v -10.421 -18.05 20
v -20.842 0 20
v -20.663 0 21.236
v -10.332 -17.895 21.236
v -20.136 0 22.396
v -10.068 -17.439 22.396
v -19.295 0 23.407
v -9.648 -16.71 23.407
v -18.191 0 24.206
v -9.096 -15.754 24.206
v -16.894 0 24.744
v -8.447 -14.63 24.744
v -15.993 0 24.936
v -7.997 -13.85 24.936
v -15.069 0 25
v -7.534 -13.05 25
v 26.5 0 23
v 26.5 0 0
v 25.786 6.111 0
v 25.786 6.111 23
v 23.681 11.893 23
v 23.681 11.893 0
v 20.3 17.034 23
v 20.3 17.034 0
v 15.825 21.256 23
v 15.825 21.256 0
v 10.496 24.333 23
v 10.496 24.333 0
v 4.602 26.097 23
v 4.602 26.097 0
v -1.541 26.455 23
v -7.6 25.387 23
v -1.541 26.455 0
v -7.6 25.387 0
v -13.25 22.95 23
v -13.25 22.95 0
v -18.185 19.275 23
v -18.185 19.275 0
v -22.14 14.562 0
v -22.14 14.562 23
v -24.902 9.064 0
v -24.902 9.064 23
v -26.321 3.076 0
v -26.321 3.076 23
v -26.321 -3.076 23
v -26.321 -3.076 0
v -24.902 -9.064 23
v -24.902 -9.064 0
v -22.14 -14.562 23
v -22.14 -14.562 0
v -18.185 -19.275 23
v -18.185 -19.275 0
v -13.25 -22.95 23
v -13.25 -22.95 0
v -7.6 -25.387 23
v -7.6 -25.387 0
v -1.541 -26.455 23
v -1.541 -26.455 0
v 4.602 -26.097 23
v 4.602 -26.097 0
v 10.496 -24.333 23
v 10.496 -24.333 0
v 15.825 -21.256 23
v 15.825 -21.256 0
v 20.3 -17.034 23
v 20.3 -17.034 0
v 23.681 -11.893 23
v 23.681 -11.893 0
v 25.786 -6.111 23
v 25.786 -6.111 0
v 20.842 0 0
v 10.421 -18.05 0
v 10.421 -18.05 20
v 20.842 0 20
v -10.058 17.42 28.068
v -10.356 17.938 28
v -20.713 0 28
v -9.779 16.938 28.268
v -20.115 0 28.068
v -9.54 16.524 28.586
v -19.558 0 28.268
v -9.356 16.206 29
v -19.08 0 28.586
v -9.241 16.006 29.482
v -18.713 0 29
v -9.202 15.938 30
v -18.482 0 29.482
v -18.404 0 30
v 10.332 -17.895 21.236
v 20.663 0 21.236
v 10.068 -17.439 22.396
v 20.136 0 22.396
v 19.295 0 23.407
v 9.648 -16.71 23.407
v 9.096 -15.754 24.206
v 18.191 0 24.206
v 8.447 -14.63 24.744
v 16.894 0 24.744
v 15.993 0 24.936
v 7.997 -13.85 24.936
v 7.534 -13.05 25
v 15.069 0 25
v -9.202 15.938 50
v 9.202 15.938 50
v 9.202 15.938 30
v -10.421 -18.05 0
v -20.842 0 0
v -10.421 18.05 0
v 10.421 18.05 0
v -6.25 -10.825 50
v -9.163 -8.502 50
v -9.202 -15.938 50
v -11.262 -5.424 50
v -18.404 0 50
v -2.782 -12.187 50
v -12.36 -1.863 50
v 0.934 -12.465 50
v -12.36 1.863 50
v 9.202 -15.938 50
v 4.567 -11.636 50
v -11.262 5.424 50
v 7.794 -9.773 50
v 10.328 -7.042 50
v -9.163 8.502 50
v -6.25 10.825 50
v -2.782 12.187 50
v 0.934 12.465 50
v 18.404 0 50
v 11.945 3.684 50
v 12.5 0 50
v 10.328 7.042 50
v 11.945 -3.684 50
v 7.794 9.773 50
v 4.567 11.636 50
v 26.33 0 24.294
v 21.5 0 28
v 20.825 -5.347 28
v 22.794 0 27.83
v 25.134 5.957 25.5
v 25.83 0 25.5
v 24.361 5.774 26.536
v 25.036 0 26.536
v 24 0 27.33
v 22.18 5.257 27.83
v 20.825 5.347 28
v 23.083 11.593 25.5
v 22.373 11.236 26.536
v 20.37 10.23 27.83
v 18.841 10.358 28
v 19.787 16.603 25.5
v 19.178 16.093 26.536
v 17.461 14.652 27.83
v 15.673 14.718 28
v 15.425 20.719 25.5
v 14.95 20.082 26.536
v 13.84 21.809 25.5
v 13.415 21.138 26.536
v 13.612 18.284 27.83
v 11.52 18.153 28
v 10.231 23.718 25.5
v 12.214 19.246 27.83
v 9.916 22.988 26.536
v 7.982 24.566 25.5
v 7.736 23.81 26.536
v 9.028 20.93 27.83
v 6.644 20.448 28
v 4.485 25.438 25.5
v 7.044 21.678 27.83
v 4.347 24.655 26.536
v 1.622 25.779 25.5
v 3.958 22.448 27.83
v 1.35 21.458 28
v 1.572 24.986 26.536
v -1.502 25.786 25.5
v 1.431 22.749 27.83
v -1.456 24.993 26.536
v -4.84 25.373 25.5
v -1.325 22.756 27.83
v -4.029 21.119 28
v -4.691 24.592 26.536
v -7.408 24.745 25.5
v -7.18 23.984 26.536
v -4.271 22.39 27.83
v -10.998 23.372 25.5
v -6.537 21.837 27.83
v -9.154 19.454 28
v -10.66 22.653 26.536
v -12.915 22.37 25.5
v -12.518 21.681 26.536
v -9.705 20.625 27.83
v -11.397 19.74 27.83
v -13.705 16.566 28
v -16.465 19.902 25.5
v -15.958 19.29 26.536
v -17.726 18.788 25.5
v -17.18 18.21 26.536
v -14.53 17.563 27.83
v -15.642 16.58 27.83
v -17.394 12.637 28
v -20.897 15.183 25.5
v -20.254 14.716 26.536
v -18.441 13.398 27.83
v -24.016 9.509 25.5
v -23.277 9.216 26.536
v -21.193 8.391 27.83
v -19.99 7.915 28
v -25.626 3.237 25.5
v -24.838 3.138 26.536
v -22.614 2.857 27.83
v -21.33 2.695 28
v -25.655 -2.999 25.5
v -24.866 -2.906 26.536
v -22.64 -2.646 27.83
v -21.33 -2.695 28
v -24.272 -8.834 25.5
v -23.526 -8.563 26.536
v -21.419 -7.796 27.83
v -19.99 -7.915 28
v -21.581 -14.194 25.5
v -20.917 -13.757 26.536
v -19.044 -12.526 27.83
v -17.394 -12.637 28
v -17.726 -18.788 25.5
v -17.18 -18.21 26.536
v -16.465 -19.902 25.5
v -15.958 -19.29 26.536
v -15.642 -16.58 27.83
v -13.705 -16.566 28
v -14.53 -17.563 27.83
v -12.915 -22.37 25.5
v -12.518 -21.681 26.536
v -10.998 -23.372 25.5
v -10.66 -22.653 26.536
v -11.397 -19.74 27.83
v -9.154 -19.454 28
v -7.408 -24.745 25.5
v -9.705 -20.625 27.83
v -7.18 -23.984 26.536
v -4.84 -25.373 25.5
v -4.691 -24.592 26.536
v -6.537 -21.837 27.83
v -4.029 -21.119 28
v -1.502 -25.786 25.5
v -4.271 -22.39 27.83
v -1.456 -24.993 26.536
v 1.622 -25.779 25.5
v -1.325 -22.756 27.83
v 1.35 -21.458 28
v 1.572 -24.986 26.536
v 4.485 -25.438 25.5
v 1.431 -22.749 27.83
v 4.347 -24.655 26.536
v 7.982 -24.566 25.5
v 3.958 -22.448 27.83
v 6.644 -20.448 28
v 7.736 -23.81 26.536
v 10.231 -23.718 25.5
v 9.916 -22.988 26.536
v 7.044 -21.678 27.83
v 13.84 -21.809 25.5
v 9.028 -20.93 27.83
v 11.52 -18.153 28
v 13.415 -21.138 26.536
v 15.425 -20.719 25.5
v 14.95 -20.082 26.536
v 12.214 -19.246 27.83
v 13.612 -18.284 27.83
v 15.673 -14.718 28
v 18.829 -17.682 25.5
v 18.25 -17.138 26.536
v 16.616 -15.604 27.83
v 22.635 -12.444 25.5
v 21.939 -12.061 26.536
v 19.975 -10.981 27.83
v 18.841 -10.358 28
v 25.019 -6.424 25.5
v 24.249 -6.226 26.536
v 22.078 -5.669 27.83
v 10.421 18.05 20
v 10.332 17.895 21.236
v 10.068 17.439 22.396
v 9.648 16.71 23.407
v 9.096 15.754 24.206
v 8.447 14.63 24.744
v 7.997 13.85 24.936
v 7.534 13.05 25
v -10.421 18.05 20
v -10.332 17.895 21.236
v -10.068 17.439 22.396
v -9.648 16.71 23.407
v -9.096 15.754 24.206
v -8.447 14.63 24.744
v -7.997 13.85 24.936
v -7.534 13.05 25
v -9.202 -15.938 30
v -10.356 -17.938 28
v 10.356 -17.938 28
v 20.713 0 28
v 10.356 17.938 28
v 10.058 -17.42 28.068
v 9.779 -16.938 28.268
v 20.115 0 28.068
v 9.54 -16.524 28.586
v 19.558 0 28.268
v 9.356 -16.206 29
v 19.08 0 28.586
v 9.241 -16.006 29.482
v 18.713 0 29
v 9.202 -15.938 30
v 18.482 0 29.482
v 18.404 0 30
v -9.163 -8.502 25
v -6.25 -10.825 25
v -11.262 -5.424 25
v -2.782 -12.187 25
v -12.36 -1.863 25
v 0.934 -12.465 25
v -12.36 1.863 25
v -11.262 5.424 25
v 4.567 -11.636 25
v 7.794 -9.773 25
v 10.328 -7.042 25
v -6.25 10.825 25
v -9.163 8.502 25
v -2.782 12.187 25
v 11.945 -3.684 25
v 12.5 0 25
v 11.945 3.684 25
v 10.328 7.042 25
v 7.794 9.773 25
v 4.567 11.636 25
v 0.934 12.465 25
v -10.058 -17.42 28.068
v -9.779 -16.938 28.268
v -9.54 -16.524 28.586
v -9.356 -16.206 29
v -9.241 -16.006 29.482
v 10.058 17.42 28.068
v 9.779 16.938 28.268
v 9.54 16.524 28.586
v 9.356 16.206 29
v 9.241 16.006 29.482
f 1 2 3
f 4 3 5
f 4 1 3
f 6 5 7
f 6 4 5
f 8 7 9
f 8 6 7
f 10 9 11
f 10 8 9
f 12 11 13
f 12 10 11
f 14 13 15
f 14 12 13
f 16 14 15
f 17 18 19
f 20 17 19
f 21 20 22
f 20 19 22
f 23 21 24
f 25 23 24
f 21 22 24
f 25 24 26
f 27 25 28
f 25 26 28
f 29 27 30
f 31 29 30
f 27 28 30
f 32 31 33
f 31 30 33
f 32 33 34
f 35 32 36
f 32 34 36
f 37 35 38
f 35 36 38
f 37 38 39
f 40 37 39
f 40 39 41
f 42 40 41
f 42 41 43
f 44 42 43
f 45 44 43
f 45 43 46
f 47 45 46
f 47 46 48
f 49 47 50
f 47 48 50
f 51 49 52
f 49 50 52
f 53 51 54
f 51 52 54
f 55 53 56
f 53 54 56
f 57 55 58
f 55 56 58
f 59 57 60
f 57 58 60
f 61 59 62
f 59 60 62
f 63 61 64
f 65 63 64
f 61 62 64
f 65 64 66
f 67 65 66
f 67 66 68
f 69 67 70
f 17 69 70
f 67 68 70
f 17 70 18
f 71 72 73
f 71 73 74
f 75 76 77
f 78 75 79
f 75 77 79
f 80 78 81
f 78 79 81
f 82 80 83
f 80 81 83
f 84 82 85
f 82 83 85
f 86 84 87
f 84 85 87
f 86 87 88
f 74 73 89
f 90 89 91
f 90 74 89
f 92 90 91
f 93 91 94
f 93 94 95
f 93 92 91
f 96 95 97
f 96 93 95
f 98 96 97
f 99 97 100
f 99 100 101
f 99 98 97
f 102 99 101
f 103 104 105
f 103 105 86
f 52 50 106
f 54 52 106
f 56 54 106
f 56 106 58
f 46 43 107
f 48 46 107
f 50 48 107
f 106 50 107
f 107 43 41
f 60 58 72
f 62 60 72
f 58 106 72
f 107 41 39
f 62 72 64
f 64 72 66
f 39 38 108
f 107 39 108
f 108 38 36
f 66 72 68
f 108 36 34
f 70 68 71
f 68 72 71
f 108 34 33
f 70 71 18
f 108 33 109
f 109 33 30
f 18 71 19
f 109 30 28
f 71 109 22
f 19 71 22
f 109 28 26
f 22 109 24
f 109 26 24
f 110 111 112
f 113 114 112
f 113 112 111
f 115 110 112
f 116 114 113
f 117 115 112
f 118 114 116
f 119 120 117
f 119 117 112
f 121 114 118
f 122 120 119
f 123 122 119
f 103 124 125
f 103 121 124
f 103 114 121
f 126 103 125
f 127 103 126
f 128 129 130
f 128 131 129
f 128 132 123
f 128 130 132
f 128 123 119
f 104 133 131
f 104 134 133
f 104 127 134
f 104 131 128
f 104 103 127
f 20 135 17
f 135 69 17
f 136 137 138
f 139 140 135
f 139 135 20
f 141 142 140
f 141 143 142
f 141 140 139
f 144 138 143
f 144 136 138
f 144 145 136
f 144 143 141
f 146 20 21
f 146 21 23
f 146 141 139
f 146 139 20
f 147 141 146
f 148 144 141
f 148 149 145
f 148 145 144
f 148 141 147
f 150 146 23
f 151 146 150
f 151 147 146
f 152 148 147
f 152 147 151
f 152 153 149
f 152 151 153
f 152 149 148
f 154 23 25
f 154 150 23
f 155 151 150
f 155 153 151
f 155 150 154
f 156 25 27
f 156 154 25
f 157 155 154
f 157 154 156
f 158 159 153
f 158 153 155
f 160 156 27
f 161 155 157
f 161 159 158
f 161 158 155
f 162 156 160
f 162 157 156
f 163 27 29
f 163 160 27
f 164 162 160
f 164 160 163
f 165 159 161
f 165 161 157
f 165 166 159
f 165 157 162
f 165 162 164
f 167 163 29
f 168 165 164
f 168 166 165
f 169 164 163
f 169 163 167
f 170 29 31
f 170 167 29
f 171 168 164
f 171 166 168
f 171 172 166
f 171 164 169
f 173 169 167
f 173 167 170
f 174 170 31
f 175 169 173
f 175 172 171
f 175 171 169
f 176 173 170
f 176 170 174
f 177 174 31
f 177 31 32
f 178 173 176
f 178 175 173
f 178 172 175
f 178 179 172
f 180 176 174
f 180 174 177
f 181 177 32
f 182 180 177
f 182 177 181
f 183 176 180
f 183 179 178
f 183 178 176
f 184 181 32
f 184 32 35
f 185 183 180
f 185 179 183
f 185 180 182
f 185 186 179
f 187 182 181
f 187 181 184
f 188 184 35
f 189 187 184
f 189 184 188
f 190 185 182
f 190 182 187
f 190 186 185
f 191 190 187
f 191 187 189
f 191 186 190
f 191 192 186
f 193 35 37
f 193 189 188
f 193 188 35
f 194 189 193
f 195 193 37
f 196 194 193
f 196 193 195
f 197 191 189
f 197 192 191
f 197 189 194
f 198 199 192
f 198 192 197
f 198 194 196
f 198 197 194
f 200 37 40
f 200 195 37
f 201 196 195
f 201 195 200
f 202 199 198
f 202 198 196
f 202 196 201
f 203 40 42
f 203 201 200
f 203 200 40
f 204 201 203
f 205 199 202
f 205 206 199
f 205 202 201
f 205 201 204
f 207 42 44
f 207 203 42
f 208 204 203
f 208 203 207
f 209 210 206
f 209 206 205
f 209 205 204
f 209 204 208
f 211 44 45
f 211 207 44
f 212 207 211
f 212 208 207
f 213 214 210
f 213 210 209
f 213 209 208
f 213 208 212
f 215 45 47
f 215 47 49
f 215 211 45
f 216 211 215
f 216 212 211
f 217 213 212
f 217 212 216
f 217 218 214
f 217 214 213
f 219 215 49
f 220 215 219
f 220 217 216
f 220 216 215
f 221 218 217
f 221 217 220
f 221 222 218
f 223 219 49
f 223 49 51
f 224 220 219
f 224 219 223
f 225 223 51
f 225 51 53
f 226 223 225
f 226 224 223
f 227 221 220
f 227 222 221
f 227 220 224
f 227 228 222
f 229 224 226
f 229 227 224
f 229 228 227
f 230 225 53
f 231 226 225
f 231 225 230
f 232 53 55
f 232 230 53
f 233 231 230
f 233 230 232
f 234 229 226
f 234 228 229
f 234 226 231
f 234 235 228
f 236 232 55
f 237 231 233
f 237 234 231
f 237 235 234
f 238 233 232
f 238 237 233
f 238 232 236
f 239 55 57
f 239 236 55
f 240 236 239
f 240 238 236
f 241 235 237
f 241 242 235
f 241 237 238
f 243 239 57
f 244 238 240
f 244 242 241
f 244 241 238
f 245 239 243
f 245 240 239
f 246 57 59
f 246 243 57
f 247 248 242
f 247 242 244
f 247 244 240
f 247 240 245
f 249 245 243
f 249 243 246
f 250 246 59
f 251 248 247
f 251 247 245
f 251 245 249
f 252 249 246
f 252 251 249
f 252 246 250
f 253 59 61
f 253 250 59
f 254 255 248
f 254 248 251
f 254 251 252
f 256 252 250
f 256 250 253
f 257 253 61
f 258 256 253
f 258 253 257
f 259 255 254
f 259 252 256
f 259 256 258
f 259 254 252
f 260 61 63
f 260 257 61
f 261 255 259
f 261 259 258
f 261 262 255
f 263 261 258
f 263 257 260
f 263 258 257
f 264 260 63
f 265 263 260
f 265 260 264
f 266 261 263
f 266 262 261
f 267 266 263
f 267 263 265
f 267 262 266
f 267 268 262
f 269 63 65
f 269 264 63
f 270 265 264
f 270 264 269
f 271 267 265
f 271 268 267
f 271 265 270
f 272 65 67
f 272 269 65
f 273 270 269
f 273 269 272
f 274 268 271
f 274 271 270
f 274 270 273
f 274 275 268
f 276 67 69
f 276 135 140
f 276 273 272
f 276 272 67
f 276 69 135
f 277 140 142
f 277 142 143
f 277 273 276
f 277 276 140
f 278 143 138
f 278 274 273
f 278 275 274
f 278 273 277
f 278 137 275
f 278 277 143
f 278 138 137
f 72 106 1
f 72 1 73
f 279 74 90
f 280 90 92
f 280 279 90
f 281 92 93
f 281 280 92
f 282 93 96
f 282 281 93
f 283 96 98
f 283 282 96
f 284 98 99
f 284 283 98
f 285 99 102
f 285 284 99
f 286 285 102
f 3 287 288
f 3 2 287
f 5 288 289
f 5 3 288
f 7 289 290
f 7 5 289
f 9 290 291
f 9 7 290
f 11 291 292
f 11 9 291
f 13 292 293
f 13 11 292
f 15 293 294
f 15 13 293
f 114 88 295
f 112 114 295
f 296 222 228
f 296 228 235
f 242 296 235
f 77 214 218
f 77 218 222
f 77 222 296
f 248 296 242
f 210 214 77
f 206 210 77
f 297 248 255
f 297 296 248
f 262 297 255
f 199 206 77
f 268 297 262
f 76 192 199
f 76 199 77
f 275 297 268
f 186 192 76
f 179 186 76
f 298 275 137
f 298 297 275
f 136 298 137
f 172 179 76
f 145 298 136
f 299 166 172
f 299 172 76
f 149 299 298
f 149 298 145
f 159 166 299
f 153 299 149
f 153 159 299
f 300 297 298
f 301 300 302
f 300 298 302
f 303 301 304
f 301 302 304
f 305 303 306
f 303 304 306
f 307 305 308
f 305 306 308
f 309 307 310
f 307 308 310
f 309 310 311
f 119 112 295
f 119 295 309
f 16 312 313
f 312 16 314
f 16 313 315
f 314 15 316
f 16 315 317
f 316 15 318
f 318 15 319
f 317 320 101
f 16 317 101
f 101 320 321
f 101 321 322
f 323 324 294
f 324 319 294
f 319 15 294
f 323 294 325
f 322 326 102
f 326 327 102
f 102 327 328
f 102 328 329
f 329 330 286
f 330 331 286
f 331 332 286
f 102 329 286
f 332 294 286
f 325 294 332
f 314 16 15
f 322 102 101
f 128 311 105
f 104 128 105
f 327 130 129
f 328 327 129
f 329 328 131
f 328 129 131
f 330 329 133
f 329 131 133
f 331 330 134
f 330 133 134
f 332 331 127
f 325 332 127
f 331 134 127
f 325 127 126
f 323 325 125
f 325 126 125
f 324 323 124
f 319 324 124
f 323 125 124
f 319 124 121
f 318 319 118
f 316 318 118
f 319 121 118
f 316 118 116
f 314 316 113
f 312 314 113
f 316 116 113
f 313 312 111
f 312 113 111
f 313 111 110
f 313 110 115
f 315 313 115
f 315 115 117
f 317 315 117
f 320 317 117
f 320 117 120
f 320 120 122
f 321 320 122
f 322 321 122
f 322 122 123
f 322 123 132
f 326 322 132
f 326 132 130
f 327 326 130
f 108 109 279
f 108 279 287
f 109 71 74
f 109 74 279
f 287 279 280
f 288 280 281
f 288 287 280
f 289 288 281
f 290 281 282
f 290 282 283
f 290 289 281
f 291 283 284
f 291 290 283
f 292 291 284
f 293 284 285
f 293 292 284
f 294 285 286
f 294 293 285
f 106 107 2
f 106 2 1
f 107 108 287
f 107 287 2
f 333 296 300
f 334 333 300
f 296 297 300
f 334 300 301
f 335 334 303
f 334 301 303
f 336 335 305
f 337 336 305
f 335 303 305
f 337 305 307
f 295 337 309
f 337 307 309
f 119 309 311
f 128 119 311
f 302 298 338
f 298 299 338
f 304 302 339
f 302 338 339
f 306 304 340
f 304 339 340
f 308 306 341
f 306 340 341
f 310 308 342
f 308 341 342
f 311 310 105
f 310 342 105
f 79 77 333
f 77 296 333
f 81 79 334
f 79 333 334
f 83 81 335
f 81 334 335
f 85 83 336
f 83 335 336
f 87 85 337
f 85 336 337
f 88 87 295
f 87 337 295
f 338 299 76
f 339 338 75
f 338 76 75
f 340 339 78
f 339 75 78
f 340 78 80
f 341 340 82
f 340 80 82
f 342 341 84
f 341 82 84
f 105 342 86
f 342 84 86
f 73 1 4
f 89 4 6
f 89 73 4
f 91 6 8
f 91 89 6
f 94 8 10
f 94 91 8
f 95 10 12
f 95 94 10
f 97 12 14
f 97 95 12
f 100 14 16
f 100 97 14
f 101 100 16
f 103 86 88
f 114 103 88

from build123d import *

# Parameters (mm, degrees)
SKETCH1_R           = 26.5
BOSS_EXTRUDE1_DEPTH = 25
SKETCH2_R           = 26.5
BOSS_EXTRUDE2_DEPTH = 25
CUT_EXTRUDE1_START  = -22
SKETCH3_R           = 26.5
CUT_EXTRUDE1_DEPTH  = 22
FILLET1_R           = 2
FILLET2_R           = 5
FILLET3_R           = 5
SKETCH4_R           = 12.5
CUT_EXTRUDE2_DEPTH  = 63.485998432


with BuildPart() as part:
    # Sketch1 → Boss-Extrude1 (new body)
    with BuildSketch(Plane.XY):
        Circle(SKETCH1_R)
        Polygon((10.421172359, 18.05), (-10.421172359, 18.05), (-20.842344718, 0), (-10.421172359, -18.05), (10.421172359, -18.05), (20.842344718, 0), align=None, mode=Mode.SUBTRACT)
    extrude(amount=BOSS_EXTRUDE1_DEPTH)

    # Sketch2 → Boss-Extrude2 (add)
    with BuildSketch(Plane.XY.offset(25)):
        Circle(SKETCH2_R)
    extrude(amount=BOSS_EXTRUDE2_DEPTH)

    # Sketch3 → Cut-Extrude1 (cut)
    with BuildSketch(Plane.XY.offset(50).offset(CUT_EXTRUDE1_START)):
        Circle(SKETCH3_R)
        Polygon((9.20178694, 15.937962501), (-9.20178694, 15.937962501), (-18.40357388, 0), (-9.20178694, -15.937962501), (9.20178694, -15.937962501), (18.40357388, 0), align=None, mode=Mode.SUBTRACT)
    extrude(amount=CUT_EXTRUDE1_DEPTH, mode=Mode.SUBTRACT)

    # Fillet1
    fillet1_edges = [part.edges().sort_by_distance(p)[0] for p in [
        (13.80268041, -7.96898125, 28),
        (13.80268041, 7.96898125, 28),
        (0, 15.937962501, 28),
        (-13.80268041, 7.96898125, 28),
        (-13.80268041, -7.96898125, 28),
        (0, -15.937962501, 28),
    ]]
    fillet(fillet1_edges, radius=FILLET1_R)

    # Fillet2
    fillet2_edges = [part.edges().sort_by_distance(p)[0] for p in [
        (15.631758538, 9.025, 25),
        (0, 18.05, 25),
        (-15.631758538, 9.025, 25),
        (-15.631758538, -9.025, 25),
        (0, -18.05, 25),
        (15.631758538, -9.025, 25),
    ]]
    fillet(fillet2_edges, radius=FILLET2_R)

    # Fillet3
    fillet3_edges = [part.edges().sort_by_distance(p)[0] for p in [
        (-26.5, 0, 28),
    ]]
    fillet(fillet3_edges, radius=FILLET3_R)

    # Sketch4 → Cut-Extrude2 (cut, through all)
    with BuildSketch(Plane.XY.offset(50)):
        Circle(SKETCH4_R)
    extrude(amount=-CUT_EXTRUDE2_DEPTH, mode=Mode.SUBTRACT)


solid = part.part
